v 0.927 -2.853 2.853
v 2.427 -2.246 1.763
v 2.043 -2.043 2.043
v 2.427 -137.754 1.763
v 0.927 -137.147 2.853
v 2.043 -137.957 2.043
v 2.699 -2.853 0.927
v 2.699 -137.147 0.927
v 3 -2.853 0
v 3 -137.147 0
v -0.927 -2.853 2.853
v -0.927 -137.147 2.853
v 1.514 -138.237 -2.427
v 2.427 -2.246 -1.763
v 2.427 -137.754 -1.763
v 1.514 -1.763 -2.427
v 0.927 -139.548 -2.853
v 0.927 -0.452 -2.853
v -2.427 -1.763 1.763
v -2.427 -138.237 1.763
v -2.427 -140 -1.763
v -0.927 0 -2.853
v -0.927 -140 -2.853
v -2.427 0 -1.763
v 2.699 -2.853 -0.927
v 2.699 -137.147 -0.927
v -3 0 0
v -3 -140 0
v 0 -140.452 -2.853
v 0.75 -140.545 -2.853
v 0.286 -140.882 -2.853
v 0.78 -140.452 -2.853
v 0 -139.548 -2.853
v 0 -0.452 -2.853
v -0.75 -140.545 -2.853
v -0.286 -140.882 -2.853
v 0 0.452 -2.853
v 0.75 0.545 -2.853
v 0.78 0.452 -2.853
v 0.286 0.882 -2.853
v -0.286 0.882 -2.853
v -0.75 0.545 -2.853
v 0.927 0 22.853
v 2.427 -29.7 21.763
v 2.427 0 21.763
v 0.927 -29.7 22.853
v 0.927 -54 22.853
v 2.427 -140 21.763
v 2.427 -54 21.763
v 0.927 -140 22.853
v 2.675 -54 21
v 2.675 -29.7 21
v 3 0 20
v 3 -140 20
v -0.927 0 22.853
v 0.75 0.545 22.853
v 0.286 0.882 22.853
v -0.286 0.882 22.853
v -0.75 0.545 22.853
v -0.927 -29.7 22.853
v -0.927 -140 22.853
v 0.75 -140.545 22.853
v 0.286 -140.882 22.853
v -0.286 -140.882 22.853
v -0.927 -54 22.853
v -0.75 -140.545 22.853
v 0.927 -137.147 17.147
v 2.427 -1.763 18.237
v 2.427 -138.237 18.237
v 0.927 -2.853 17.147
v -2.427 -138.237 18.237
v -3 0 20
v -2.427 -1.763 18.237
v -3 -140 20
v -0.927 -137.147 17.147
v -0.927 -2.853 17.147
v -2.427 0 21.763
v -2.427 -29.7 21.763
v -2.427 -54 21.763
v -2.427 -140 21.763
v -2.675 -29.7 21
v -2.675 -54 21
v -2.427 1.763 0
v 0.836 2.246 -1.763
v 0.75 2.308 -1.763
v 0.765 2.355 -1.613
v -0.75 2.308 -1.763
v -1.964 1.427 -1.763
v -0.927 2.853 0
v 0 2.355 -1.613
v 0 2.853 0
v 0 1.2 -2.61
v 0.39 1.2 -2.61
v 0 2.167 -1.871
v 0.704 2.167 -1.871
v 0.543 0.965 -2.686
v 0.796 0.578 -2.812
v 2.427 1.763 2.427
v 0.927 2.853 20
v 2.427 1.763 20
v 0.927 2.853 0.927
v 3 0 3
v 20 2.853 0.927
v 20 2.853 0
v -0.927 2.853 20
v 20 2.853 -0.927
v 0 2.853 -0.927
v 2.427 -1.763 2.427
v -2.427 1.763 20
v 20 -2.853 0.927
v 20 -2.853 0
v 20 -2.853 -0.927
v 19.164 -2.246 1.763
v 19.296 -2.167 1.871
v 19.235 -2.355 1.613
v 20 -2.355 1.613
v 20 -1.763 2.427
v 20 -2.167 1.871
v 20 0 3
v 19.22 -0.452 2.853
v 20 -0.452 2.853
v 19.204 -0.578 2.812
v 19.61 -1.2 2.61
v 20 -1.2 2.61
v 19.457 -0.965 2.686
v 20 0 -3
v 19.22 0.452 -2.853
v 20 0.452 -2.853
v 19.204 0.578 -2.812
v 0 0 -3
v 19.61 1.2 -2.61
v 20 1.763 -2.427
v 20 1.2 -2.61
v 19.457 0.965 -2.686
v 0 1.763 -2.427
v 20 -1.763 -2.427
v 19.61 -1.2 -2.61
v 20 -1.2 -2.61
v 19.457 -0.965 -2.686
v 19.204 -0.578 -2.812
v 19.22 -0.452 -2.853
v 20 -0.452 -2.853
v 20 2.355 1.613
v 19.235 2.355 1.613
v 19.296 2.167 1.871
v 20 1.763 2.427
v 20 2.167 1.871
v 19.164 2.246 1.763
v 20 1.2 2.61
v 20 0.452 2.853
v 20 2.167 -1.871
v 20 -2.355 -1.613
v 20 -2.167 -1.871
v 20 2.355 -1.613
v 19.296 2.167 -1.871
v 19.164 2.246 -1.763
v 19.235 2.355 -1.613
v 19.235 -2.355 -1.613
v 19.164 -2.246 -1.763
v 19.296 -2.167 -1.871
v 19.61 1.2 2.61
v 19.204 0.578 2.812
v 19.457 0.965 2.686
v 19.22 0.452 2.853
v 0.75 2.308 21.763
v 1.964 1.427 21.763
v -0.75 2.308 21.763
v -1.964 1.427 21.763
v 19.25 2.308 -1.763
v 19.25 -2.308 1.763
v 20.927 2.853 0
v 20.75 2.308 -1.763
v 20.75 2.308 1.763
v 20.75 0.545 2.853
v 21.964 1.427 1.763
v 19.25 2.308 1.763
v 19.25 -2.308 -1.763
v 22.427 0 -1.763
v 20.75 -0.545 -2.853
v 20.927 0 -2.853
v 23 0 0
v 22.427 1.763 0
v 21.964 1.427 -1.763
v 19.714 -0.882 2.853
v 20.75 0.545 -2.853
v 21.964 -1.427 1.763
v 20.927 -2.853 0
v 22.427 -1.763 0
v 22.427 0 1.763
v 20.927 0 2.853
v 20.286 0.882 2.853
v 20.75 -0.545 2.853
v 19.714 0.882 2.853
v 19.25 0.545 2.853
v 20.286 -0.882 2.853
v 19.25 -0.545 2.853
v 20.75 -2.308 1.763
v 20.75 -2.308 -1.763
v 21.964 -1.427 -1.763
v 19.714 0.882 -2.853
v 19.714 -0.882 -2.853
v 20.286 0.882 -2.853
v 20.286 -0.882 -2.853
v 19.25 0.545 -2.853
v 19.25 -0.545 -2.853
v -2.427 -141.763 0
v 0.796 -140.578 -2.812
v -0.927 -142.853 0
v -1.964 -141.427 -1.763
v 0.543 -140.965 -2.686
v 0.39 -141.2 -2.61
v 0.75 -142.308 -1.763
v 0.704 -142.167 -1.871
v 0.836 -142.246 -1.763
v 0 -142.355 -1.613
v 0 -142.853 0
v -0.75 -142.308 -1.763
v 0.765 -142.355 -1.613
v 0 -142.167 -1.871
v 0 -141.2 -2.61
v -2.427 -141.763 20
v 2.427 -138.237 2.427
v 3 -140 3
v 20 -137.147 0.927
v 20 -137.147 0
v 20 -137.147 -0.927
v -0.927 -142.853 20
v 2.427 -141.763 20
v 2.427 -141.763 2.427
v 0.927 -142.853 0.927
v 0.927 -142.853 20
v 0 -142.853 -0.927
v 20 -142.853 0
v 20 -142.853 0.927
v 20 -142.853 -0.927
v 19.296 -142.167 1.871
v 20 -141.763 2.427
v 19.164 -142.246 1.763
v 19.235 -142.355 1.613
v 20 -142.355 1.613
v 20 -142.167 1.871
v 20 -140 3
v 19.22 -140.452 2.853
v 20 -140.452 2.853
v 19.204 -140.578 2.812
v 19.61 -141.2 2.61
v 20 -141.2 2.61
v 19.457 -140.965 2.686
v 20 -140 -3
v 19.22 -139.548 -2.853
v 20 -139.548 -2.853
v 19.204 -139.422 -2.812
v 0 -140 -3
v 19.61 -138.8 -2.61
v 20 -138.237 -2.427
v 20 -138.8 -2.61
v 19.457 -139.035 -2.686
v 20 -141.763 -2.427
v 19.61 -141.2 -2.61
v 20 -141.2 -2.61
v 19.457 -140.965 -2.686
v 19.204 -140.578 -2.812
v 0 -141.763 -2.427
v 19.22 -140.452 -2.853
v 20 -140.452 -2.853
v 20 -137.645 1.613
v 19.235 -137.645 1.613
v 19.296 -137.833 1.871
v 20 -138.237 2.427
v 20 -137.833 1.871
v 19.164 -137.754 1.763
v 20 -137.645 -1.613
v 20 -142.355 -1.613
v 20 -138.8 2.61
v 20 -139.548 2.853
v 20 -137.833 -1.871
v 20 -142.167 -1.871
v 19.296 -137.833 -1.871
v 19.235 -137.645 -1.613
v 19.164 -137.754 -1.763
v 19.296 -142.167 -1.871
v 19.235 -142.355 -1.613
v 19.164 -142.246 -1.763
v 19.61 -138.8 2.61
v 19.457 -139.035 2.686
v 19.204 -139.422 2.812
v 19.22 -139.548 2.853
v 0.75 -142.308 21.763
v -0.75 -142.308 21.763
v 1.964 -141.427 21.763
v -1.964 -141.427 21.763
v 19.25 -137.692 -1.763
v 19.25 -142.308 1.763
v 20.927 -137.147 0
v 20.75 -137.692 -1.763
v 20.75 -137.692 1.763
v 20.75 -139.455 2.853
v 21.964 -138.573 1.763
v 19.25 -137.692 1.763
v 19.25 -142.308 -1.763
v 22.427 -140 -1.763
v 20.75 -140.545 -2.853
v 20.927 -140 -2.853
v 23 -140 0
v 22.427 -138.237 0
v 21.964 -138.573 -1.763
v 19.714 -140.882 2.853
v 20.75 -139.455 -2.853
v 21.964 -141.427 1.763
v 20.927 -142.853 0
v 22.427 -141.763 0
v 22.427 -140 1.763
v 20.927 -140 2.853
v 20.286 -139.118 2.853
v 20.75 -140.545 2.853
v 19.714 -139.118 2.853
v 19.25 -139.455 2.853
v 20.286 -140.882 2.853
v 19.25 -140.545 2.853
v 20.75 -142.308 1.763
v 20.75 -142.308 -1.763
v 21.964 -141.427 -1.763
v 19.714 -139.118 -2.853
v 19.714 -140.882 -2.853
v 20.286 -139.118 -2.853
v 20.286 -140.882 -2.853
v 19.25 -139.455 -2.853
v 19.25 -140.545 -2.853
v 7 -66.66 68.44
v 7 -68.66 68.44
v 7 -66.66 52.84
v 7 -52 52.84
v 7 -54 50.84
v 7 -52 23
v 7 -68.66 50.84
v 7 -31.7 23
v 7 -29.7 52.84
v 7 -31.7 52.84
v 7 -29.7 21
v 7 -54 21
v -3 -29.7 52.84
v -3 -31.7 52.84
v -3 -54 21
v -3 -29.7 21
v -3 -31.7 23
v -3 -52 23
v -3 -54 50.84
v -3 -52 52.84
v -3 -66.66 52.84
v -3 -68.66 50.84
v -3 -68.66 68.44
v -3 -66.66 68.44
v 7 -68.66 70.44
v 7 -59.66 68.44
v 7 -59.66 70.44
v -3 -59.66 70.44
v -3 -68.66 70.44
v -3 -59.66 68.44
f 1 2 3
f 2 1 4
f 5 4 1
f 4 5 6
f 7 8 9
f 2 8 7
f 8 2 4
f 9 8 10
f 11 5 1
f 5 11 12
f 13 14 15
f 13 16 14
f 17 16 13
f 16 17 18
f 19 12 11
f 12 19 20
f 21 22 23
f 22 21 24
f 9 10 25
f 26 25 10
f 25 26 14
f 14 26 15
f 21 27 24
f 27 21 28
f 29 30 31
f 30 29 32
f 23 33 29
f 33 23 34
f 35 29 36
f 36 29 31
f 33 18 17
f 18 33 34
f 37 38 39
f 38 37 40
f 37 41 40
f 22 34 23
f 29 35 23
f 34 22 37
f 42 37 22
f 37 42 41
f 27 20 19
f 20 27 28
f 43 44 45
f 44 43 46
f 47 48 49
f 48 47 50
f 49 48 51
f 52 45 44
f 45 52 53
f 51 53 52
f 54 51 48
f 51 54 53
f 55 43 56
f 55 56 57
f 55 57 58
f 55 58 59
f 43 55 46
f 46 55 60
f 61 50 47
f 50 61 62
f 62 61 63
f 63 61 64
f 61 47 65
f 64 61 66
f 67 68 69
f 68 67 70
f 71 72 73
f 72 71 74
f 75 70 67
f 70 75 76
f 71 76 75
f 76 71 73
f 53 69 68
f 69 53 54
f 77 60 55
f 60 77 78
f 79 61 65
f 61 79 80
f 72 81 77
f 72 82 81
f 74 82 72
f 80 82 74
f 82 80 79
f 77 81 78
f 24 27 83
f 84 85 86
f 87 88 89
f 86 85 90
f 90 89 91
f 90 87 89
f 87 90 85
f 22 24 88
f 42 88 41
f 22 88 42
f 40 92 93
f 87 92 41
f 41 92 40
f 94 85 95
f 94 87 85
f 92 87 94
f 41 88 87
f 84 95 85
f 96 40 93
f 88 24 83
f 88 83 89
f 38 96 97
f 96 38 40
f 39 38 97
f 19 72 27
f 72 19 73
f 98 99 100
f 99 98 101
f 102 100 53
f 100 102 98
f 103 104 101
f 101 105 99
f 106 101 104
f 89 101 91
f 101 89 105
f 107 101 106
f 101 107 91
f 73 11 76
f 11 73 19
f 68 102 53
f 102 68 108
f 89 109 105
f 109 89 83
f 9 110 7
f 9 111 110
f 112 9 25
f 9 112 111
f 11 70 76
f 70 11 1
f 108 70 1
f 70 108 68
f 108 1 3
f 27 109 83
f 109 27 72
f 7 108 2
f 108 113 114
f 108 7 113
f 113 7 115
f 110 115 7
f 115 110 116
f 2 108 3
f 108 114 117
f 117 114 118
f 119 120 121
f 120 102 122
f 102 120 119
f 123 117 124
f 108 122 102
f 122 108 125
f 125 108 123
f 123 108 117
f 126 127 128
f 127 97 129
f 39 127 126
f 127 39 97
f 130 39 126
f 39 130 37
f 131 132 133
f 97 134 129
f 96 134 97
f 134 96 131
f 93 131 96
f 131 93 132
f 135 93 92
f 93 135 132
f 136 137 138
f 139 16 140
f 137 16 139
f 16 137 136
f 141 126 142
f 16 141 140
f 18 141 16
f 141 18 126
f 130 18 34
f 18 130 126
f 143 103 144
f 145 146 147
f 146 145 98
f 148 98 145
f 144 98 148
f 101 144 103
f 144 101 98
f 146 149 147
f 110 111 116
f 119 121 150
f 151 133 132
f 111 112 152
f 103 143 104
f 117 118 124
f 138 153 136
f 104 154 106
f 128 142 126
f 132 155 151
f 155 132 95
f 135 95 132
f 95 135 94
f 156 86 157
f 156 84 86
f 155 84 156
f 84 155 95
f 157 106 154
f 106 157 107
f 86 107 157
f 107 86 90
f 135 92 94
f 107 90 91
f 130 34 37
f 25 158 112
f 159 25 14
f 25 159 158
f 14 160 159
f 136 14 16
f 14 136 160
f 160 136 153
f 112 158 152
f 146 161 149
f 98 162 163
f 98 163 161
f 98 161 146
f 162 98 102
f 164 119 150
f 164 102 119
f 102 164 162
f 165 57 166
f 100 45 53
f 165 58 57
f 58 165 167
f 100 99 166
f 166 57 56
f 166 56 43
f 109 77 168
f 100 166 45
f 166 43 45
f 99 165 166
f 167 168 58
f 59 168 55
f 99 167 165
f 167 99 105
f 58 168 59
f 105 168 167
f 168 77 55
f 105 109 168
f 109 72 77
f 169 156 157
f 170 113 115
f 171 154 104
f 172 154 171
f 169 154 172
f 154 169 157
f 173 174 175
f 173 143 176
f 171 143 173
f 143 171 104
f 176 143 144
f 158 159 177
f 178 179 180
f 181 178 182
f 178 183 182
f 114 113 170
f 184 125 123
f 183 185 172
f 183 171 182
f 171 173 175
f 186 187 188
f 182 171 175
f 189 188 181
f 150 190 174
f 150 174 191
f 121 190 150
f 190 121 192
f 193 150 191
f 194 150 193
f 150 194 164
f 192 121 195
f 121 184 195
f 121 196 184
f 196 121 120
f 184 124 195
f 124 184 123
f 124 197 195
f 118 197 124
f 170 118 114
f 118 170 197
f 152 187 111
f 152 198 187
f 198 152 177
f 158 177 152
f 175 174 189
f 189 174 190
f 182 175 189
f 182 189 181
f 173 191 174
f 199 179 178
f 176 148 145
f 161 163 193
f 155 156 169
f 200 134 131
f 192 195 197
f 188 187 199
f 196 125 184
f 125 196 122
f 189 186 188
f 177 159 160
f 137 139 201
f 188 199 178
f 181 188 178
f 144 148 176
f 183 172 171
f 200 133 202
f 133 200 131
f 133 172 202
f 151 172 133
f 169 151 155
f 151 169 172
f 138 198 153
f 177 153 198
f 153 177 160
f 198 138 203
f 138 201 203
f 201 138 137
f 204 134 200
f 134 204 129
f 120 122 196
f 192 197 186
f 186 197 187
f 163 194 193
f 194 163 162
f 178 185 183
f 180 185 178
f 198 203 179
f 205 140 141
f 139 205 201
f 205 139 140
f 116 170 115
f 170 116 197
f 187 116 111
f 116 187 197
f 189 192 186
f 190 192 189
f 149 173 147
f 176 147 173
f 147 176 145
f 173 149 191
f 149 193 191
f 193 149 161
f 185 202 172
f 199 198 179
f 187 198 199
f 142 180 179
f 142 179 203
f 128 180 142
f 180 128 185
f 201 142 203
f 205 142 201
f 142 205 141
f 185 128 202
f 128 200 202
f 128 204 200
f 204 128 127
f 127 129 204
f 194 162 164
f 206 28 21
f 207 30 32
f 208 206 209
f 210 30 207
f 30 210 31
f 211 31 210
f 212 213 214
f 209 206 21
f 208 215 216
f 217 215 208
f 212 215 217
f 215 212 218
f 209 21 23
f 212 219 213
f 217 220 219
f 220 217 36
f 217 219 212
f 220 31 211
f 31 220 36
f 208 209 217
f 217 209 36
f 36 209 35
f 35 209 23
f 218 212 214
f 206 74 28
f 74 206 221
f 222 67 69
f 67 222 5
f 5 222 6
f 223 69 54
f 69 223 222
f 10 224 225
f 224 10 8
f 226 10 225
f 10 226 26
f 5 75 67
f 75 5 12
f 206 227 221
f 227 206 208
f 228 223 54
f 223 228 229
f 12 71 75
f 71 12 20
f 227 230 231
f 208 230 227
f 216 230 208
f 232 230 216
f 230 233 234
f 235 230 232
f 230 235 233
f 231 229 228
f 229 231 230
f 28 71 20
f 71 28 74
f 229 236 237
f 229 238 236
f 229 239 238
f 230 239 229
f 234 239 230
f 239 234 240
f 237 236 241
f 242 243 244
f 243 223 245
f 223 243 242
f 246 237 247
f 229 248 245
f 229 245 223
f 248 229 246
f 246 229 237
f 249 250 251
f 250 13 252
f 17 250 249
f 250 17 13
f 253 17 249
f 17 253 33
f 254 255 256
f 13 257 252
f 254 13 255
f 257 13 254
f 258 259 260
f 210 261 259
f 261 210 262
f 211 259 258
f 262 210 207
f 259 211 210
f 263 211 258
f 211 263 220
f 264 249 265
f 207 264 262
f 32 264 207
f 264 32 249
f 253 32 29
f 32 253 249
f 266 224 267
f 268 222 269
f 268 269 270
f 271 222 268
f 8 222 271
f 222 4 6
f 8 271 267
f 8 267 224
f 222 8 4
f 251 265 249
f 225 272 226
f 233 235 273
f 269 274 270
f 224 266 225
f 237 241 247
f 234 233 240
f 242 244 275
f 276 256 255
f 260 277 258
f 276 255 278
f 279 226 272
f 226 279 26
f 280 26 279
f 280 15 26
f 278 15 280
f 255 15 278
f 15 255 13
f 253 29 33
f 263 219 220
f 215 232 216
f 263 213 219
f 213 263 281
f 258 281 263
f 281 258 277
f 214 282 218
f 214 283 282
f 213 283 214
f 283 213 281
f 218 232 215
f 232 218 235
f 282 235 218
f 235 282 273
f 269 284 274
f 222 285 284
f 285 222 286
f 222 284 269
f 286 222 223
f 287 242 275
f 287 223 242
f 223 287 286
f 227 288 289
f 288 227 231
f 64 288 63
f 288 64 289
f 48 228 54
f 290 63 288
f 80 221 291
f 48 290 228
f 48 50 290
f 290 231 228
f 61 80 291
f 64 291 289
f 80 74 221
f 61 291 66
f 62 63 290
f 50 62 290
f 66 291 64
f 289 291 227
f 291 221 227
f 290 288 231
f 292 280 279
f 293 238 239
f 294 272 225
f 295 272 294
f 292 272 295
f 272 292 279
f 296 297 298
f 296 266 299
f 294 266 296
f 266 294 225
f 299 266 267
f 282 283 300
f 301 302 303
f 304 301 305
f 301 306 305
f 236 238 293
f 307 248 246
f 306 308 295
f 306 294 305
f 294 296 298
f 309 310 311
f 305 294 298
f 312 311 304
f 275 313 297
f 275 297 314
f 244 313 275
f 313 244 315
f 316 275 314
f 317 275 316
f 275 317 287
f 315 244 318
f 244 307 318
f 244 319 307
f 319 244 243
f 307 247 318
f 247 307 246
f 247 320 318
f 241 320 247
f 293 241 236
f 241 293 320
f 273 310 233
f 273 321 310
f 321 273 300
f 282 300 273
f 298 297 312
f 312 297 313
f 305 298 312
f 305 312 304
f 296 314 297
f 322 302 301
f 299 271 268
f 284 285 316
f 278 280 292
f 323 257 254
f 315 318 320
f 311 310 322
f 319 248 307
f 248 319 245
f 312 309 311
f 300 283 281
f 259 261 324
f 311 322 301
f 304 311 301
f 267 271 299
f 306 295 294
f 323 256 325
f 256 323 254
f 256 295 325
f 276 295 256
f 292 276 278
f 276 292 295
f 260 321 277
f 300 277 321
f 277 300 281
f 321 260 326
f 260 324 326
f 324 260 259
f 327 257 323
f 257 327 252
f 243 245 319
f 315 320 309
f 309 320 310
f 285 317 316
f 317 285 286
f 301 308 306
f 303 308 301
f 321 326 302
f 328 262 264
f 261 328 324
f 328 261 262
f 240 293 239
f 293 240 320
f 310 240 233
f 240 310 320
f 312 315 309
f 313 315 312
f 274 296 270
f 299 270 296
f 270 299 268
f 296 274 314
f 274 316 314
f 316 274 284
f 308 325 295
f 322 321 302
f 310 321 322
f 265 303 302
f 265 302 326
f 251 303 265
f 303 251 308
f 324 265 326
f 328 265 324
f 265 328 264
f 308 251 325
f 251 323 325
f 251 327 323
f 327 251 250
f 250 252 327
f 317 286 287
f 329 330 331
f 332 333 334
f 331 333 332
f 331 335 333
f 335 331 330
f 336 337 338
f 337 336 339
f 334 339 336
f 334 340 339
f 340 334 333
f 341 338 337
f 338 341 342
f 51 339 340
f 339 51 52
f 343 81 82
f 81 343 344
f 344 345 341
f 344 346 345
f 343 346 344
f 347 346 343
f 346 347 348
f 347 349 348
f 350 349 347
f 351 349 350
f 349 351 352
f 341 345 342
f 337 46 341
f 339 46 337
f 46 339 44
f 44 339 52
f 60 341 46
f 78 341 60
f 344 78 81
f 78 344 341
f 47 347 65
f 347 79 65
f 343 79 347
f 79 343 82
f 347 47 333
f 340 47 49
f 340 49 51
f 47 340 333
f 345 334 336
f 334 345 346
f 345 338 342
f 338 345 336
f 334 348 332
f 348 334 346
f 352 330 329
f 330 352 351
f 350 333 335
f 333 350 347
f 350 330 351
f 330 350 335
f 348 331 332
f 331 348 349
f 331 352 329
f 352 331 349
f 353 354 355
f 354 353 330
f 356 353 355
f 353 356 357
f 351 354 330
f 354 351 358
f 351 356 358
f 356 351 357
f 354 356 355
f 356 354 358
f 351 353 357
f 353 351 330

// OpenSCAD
r = 3;
d = 140;
h = 20;

t = 2;

grip_y = 10;
top_grip_y = 7;

metal_w = 20.3;
metal_h = 29.84;

wood_l = 14.66;
wood_h = 15.6;

for (z = [0, h]){
    translate([0, 0, z])
    rotate([90, 0, 0])
    cylinder(d, r, r);
}

for (y = [0, d]){
    translate([0, -y, 0]){
        sphere(r);
        cylinder(h, r, r);
        rotate([0, 90, 0])
        cylinder(h, r, r);
        translate([0, 0, h])
        sphere(r);
        translate([h, 0, 0])
        sphere(r);
    }
}

skew = 0.15;
d_f = skew - 0.5;

translate([-r, d_f * d -grip_y/2, h + r-t])
difference(){
    cube([grip_y, metal_w + 2*t, metal_h + t]);
    translate([0, t, t])
    cube([grip_y, metal_w, metal_h]);
}

translate([-r, d_f * d - grip_y/2 - wood_l, metal_h + h + r-t])
difference(){
    cube([grip_y, wood_l + t, wood_h + t]);
    translate([0, t, t])
    cube([grip_y, wood_l, wood_h]);
}

translate([-r, d_f * d - grip_y/2 - wood_l, wood_h + metal_h + h + r])
cube([grip_y, t + top_grip_y, t]);
